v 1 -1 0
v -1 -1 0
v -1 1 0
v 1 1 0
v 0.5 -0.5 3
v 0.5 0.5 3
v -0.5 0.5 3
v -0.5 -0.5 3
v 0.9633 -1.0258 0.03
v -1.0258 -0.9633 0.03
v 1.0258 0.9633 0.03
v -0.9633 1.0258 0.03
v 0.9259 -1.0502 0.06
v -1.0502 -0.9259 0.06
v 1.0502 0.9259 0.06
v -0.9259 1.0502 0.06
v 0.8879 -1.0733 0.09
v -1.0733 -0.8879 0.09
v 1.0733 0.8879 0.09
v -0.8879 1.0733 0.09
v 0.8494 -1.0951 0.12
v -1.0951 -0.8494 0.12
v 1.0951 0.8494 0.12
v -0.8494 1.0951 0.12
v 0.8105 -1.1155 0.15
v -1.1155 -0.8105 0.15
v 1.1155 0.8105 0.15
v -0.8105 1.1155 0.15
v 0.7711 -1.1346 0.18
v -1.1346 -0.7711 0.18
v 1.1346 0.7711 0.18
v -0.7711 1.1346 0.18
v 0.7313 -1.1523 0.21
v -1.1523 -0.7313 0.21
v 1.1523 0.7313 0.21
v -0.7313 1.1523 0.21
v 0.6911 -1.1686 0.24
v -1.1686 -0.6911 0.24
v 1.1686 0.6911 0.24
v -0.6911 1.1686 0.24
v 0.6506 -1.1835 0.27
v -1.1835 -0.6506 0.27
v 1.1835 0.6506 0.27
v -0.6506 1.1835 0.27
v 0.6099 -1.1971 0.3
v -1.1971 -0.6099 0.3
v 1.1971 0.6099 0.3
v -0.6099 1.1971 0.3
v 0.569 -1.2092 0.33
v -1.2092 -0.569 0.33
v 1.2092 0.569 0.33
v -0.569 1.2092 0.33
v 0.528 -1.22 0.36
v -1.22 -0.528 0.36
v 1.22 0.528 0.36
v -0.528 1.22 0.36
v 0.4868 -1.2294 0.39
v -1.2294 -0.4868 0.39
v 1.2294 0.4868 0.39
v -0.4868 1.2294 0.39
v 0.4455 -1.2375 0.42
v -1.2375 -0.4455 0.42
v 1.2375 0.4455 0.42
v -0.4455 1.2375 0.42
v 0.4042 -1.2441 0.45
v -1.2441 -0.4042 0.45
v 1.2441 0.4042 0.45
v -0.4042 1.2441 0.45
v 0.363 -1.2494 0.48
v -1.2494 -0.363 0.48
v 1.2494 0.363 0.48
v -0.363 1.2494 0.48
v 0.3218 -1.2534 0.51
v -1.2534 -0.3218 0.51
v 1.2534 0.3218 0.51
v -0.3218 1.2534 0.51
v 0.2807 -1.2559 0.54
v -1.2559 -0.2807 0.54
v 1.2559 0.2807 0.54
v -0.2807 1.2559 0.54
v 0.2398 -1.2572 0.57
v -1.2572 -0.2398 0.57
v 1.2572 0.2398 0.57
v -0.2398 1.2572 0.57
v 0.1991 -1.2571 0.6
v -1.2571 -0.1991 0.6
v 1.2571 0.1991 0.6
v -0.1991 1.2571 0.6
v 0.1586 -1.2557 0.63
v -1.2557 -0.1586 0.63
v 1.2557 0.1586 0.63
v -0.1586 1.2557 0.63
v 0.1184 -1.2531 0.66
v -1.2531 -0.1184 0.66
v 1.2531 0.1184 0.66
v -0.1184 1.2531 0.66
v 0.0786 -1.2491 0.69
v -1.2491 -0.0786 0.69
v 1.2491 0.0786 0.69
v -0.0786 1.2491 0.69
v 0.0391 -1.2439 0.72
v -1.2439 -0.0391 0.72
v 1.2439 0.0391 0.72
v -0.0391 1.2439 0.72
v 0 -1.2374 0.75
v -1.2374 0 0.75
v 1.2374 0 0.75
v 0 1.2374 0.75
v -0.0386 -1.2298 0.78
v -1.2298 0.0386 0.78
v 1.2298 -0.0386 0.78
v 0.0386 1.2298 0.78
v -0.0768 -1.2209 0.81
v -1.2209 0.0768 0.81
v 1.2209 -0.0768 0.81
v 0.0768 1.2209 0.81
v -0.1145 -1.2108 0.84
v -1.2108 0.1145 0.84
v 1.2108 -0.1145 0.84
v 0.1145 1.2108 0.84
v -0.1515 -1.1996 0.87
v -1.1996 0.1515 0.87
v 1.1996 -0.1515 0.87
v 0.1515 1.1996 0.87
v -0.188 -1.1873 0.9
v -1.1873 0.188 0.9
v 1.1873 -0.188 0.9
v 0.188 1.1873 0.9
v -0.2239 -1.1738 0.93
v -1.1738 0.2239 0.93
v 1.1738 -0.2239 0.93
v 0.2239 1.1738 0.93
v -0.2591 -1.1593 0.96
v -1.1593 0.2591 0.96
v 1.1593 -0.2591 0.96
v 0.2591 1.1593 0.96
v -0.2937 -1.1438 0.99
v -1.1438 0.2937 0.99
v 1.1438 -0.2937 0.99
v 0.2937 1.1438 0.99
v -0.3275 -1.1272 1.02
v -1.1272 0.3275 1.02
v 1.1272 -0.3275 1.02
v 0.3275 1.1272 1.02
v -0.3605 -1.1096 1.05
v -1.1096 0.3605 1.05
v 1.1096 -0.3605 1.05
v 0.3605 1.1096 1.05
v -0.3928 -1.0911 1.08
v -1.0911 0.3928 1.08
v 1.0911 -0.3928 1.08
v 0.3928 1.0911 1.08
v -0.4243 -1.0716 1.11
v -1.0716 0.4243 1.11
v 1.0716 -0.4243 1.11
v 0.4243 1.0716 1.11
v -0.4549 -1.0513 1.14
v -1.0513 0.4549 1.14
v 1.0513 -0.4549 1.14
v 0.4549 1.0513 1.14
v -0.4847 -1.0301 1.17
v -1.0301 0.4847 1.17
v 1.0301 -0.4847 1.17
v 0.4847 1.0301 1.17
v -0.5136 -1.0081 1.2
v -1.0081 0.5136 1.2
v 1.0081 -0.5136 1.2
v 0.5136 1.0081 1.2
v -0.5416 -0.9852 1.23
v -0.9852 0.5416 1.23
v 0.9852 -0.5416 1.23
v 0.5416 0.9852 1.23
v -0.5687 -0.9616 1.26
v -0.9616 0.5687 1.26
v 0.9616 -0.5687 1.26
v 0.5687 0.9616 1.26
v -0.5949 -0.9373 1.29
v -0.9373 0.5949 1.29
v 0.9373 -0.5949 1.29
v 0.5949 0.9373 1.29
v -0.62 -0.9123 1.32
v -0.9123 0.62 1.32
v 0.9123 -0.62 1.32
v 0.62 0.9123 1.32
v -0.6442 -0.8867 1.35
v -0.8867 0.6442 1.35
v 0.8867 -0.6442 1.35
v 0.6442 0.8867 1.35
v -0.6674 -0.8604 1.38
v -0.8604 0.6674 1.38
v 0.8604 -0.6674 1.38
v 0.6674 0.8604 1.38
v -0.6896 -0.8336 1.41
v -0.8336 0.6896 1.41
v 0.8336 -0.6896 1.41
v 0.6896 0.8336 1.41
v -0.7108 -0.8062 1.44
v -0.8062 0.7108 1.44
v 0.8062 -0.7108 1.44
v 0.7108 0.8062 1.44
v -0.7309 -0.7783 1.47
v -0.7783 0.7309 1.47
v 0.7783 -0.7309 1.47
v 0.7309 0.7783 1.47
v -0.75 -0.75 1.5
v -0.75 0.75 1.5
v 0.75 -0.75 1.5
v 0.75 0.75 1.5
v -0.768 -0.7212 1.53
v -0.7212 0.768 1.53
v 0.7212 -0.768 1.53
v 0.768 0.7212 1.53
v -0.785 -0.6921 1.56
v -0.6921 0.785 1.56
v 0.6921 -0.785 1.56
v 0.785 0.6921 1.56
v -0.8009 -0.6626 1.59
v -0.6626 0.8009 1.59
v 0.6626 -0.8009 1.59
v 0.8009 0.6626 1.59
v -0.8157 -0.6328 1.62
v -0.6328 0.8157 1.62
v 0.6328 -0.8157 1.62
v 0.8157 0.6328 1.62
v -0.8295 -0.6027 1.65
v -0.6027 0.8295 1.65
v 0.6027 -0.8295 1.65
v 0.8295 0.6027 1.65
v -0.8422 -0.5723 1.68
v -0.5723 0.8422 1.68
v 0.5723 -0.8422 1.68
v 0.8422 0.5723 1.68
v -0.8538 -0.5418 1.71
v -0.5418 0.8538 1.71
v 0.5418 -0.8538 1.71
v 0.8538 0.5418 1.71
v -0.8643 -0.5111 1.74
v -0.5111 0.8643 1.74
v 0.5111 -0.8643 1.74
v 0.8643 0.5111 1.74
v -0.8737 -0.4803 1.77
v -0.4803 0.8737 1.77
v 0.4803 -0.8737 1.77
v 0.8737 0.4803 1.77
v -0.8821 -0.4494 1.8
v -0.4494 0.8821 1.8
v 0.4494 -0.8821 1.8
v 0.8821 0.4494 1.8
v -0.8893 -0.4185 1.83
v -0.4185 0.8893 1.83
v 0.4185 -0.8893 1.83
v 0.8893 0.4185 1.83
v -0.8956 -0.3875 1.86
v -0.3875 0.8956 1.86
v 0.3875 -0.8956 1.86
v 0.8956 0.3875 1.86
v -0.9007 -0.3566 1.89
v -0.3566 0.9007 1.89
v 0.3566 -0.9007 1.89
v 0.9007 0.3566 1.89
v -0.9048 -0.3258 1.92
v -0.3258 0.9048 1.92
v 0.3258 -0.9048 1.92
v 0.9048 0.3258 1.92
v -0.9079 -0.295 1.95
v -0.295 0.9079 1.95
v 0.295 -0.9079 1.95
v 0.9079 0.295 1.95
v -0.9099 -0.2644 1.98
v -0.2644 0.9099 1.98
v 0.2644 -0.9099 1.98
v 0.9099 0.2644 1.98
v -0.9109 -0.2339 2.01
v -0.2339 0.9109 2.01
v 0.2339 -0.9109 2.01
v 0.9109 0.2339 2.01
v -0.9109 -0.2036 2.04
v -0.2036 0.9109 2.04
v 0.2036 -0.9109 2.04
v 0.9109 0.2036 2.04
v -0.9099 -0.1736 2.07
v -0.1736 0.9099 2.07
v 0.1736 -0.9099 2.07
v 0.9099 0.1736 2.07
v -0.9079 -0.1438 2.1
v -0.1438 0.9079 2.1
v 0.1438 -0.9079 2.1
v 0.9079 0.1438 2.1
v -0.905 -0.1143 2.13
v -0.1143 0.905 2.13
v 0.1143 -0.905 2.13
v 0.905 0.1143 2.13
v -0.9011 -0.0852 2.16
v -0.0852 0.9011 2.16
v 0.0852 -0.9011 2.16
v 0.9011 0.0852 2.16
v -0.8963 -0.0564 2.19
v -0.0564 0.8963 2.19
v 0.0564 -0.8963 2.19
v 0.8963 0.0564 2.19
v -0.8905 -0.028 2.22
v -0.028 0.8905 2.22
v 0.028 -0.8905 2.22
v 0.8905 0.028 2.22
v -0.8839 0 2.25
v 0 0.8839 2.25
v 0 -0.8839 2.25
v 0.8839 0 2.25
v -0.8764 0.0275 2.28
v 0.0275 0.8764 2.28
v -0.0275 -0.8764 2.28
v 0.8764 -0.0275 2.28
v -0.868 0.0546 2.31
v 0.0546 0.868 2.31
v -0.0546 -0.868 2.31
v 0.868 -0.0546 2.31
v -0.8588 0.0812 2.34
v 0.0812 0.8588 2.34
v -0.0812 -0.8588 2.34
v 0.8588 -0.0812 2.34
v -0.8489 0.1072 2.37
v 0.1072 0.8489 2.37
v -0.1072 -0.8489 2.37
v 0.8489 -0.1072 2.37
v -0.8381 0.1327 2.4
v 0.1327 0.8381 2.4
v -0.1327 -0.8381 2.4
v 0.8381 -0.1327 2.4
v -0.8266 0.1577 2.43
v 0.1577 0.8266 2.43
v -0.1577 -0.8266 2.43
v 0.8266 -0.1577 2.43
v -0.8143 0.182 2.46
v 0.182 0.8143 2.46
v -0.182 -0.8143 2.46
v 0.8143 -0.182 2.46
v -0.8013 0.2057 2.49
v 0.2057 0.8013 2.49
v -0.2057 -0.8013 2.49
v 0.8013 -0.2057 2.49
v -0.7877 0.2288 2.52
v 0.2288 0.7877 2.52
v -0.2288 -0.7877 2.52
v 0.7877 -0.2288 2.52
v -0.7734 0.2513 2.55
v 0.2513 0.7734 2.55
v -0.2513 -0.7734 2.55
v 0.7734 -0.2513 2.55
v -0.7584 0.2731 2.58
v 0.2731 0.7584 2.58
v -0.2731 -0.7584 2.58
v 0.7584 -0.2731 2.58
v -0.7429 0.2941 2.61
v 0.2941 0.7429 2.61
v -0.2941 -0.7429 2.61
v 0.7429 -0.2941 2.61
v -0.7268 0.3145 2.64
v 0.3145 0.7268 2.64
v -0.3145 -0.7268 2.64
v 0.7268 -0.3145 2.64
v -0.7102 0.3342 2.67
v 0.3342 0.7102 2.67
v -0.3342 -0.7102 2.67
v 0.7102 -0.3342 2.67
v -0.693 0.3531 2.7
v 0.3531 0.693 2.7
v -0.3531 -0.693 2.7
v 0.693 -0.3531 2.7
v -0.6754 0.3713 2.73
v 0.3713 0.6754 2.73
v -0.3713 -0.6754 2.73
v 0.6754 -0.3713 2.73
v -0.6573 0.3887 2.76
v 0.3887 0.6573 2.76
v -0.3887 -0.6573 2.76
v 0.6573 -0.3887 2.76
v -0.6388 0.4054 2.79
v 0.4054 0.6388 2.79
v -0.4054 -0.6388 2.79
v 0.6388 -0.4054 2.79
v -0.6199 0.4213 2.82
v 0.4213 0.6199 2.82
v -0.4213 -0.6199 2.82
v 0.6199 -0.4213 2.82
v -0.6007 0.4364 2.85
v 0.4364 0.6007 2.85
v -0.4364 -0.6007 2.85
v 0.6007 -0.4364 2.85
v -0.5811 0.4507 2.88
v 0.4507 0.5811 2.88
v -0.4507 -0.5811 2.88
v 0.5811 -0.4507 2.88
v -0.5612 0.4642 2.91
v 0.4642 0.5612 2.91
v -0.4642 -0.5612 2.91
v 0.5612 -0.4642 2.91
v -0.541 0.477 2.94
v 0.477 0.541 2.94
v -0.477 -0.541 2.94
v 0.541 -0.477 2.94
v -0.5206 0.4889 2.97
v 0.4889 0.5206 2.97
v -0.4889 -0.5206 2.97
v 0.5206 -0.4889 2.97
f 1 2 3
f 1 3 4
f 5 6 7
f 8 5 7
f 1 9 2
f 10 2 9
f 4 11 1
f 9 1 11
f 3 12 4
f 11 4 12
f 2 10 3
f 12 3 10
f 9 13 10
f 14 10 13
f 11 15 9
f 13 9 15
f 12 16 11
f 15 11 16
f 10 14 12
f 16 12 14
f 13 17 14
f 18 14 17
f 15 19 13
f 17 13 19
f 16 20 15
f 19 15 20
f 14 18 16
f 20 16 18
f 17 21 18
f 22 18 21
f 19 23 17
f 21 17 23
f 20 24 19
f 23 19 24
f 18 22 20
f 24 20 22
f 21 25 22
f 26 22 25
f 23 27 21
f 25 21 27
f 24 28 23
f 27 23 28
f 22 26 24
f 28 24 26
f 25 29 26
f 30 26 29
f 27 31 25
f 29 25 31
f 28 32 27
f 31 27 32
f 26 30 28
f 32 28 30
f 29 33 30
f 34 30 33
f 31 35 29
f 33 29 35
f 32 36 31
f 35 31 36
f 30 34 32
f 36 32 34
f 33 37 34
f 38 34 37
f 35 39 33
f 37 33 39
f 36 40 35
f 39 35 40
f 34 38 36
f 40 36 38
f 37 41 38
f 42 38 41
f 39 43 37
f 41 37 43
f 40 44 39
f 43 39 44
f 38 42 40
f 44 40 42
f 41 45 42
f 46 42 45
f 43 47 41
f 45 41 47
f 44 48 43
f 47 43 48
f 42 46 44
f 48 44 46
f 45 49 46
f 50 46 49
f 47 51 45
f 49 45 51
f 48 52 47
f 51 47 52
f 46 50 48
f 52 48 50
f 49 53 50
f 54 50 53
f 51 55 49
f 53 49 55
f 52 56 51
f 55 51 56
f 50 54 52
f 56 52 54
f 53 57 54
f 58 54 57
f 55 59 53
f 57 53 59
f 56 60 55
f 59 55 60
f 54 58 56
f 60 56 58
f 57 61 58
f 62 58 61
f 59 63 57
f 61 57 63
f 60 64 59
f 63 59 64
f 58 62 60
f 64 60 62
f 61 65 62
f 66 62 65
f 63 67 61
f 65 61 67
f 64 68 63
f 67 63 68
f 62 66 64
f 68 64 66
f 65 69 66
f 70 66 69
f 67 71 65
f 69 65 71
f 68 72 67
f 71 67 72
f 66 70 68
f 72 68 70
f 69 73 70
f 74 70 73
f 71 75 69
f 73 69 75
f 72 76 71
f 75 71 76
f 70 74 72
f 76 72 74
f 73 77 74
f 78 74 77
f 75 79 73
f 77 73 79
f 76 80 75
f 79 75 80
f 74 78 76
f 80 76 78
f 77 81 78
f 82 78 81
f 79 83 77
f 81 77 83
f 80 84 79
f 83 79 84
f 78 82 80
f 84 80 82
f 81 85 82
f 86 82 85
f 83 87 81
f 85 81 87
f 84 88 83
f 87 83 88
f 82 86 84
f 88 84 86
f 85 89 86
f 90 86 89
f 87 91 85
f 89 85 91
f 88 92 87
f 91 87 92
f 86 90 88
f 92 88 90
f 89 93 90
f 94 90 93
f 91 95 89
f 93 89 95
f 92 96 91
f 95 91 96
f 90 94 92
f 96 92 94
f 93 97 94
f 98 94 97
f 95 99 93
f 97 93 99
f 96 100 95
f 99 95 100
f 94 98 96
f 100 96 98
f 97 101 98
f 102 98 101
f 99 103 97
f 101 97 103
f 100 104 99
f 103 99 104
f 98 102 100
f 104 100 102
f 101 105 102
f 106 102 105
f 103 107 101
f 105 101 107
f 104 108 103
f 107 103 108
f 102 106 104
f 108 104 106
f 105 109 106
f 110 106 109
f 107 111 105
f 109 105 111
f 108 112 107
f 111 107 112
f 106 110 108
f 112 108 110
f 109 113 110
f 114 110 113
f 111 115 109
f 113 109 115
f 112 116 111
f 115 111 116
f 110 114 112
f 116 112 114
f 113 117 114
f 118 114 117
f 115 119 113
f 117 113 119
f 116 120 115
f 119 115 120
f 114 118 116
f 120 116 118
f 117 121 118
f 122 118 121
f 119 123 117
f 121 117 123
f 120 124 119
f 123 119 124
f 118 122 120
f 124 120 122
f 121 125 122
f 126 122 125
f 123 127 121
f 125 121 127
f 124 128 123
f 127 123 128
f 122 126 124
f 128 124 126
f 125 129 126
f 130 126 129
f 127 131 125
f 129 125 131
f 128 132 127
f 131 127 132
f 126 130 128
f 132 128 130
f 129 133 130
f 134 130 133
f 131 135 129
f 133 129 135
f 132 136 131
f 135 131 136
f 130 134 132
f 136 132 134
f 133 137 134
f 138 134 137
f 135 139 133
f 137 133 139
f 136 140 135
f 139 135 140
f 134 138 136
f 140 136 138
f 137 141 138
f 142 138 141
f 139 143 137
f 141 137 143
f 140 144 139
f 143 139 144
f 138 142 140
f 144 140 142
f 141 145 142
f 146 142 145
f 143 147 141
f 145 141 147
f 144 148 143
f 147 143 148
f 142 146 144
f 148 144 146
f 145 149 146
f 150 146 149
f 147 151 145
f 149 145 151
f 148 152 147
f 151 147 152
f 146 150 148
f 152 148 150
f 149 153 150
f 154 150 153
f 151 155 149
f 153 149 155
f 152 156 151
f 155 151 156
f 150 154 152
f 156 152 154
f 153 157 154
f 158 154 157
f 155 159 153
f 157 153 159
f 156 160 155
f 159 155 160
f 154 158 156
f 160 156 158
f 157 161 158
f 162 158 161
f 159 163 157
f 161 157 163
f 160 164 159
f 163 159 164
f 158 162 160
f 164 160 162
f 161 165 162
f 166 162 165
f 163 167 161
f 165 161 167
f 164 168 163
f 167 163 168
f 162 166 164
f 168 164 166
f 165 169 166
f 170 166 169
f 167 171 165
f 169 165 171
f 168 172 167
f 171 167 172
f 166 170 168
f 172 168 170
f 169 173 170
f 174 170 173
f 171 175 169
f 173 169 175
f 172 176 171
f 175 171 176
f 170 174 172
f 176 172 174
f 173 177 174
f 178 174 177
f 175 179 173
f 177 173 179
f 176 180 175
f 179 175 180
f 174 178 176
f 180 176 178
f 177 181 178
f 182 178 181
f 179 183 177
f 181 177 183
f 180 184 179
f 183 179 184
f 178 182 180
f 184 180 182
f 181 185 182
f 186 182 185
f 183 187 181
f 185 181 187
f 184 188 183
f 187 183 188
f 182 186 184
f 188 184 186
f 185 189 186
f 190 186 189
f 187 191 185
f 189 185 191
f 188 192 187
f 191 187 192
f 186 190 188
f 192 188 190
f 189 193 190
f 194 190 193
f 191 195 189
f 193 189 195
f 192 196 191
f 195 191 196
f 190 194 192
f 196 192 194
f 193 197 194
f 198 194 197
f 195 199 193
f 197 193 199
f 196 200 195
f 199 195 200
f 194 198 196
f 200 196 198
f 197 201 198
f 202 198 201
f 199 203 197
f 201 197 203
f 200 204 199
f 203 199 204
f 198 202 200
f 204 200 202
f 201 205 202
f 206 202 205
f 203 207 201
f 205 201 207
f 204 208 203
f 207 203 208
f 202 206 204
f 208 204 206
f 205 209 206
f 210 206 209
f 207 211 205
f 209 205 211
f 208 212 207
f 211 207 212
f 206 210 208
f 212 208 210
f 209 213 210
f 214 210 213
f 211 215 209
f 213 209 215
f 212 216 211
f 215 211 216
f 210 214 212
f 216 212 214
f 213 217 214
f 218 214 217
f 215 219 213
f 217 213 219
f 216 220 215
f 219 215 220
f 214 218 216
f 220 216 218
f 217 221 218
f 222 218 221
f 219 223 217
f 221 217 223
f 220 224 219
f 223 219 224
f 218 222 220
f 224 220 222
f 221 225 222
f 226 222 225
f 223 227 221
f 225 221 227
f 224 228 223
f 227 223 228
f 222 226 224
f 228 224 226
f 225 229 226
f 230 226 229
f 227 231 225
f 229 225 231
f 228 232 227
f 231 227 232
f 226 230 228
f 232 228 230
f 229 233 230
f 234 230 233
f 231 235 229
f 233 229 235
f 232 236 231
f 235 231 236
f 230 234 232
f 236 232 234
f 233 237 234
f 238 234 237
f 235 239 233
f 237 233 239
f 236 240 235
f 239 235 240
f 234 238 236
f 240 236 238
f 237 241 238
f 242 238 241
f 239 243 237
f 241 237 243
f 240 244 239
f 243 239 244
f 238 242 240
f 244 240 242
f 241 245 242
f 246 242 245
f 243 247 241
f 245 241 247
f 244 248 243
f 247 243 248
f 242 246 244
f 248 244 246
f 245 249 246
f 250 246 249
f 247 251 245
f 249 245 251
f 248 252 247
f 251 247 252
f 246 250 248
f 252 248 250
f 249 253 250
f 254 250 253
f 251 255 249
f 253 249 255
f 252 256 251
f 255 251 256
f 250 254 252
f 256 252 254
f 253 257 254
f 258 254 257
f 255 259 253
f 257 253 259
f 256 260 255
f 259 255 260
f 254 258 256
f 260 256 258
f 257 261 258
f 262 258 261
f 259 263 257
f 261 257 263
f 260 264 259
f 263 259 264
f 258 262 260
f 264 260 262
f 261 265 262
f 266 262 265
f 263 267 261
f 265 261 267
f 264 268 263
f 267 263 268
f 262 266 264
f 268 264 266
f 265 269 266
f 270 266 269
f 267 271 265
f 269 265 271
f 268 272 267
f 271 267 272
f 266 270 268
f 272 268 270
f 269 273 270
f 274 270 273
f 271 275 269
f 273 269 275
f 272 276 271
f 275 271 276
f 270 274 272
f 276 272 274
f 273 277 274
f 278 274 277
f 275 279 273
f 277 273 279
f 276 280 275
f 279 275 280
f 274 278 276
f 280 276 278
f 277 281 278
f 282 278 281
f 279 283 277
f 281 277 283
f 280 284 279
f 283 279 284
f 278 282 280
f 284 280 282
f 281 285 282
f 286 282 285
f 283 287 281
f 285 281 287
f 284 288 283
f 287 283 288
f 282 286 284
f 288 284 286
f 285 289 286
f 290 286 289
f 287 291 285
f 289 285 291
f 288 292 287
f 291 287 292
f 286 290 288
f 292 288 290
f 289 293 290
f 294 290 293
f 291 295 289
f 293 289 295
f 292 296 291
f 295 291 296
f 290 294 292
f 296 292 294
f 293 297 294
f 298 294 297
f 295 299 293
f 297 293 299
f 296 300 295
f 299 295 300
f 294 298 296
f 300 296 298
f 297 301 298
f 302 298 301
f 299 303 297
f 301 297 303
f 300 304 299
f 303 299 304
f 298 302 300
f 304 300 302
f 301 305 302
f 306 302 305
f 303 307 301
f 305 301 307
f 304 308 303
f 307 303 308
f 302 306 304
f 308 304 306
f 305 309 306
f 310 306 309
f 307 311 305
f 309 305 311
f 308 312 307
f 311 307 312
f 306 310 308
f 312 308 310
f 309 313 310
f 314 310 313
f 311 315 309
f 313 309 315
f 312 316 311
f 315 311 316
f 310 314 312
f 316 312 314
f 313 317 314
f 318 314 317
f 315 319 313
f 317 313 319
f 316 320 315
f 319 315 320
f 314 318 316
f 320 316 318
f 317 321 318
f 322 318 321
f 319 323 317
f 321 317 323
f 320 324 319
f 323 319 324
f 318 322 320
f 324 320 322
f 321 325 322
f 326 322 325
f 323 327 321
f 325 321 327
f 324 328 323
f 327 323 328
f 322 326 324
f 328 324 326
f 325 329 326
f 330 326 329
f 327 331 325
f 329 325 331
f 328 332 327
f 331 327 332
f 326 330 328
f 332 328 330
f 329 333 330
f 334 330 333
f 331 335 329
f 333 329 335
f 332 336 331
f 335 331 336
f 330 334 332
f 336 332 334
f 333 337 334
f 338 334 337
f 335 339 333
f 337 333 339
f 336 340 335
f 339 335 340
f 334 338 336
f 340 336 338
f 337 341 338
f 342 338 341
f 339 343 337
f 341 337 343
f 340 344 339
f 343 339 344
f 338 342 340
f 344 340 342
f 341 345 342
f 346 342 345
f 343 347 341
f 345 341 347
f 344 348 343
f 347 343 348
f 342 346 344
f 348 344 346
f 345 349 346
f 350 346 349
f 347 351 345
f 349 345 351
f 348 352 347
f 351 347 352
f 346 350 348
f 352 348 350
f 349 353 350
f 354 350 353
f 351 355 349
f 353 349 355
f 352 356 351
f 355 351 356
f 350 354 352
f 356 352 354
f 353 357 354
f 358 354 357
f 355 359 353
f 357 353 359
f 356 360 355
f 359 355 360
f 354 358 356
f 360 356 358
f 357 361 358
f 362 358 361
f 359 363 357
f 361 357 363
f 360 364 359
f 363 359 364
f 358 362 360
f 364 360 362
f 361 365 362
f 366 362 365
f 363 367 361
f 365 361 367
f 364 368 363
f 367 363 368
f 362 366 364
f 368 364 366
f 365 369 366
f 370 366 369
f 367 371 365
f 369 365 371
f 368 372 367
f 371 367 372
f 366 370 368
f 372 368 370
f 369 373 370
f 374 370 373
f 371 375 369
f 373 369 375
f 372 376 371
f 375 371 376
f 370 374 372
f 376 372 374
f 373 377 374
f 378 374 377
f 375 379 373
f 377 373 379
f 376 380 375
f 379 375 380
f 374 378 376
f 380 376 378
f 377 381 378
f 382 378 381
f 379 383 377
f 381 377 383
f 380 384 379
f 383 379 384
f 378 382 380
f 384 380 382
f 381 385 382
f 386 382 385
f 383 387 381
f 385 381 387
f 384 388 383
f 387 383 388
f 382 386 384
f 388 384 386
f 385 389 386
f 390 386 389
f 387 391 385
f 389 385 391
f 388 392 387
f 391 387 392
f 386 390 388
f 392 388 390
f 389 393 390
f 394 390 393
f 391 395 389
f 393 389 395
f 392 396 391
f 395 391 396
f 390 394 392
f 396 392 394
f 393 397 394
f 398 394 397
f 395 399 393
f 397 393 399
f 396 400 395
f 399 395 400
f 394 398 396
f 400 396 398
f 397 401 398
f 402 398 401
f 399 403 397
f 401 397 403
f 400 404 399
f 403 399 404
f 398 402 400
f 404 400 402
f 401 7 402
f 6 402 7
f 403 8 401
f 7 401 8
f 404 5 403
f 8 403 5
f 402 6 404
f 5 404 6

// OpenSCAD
$fn=200;
linear_extrude(height=3, twist=180, scale=0.5)
square(size=[2, 2], center=true);
